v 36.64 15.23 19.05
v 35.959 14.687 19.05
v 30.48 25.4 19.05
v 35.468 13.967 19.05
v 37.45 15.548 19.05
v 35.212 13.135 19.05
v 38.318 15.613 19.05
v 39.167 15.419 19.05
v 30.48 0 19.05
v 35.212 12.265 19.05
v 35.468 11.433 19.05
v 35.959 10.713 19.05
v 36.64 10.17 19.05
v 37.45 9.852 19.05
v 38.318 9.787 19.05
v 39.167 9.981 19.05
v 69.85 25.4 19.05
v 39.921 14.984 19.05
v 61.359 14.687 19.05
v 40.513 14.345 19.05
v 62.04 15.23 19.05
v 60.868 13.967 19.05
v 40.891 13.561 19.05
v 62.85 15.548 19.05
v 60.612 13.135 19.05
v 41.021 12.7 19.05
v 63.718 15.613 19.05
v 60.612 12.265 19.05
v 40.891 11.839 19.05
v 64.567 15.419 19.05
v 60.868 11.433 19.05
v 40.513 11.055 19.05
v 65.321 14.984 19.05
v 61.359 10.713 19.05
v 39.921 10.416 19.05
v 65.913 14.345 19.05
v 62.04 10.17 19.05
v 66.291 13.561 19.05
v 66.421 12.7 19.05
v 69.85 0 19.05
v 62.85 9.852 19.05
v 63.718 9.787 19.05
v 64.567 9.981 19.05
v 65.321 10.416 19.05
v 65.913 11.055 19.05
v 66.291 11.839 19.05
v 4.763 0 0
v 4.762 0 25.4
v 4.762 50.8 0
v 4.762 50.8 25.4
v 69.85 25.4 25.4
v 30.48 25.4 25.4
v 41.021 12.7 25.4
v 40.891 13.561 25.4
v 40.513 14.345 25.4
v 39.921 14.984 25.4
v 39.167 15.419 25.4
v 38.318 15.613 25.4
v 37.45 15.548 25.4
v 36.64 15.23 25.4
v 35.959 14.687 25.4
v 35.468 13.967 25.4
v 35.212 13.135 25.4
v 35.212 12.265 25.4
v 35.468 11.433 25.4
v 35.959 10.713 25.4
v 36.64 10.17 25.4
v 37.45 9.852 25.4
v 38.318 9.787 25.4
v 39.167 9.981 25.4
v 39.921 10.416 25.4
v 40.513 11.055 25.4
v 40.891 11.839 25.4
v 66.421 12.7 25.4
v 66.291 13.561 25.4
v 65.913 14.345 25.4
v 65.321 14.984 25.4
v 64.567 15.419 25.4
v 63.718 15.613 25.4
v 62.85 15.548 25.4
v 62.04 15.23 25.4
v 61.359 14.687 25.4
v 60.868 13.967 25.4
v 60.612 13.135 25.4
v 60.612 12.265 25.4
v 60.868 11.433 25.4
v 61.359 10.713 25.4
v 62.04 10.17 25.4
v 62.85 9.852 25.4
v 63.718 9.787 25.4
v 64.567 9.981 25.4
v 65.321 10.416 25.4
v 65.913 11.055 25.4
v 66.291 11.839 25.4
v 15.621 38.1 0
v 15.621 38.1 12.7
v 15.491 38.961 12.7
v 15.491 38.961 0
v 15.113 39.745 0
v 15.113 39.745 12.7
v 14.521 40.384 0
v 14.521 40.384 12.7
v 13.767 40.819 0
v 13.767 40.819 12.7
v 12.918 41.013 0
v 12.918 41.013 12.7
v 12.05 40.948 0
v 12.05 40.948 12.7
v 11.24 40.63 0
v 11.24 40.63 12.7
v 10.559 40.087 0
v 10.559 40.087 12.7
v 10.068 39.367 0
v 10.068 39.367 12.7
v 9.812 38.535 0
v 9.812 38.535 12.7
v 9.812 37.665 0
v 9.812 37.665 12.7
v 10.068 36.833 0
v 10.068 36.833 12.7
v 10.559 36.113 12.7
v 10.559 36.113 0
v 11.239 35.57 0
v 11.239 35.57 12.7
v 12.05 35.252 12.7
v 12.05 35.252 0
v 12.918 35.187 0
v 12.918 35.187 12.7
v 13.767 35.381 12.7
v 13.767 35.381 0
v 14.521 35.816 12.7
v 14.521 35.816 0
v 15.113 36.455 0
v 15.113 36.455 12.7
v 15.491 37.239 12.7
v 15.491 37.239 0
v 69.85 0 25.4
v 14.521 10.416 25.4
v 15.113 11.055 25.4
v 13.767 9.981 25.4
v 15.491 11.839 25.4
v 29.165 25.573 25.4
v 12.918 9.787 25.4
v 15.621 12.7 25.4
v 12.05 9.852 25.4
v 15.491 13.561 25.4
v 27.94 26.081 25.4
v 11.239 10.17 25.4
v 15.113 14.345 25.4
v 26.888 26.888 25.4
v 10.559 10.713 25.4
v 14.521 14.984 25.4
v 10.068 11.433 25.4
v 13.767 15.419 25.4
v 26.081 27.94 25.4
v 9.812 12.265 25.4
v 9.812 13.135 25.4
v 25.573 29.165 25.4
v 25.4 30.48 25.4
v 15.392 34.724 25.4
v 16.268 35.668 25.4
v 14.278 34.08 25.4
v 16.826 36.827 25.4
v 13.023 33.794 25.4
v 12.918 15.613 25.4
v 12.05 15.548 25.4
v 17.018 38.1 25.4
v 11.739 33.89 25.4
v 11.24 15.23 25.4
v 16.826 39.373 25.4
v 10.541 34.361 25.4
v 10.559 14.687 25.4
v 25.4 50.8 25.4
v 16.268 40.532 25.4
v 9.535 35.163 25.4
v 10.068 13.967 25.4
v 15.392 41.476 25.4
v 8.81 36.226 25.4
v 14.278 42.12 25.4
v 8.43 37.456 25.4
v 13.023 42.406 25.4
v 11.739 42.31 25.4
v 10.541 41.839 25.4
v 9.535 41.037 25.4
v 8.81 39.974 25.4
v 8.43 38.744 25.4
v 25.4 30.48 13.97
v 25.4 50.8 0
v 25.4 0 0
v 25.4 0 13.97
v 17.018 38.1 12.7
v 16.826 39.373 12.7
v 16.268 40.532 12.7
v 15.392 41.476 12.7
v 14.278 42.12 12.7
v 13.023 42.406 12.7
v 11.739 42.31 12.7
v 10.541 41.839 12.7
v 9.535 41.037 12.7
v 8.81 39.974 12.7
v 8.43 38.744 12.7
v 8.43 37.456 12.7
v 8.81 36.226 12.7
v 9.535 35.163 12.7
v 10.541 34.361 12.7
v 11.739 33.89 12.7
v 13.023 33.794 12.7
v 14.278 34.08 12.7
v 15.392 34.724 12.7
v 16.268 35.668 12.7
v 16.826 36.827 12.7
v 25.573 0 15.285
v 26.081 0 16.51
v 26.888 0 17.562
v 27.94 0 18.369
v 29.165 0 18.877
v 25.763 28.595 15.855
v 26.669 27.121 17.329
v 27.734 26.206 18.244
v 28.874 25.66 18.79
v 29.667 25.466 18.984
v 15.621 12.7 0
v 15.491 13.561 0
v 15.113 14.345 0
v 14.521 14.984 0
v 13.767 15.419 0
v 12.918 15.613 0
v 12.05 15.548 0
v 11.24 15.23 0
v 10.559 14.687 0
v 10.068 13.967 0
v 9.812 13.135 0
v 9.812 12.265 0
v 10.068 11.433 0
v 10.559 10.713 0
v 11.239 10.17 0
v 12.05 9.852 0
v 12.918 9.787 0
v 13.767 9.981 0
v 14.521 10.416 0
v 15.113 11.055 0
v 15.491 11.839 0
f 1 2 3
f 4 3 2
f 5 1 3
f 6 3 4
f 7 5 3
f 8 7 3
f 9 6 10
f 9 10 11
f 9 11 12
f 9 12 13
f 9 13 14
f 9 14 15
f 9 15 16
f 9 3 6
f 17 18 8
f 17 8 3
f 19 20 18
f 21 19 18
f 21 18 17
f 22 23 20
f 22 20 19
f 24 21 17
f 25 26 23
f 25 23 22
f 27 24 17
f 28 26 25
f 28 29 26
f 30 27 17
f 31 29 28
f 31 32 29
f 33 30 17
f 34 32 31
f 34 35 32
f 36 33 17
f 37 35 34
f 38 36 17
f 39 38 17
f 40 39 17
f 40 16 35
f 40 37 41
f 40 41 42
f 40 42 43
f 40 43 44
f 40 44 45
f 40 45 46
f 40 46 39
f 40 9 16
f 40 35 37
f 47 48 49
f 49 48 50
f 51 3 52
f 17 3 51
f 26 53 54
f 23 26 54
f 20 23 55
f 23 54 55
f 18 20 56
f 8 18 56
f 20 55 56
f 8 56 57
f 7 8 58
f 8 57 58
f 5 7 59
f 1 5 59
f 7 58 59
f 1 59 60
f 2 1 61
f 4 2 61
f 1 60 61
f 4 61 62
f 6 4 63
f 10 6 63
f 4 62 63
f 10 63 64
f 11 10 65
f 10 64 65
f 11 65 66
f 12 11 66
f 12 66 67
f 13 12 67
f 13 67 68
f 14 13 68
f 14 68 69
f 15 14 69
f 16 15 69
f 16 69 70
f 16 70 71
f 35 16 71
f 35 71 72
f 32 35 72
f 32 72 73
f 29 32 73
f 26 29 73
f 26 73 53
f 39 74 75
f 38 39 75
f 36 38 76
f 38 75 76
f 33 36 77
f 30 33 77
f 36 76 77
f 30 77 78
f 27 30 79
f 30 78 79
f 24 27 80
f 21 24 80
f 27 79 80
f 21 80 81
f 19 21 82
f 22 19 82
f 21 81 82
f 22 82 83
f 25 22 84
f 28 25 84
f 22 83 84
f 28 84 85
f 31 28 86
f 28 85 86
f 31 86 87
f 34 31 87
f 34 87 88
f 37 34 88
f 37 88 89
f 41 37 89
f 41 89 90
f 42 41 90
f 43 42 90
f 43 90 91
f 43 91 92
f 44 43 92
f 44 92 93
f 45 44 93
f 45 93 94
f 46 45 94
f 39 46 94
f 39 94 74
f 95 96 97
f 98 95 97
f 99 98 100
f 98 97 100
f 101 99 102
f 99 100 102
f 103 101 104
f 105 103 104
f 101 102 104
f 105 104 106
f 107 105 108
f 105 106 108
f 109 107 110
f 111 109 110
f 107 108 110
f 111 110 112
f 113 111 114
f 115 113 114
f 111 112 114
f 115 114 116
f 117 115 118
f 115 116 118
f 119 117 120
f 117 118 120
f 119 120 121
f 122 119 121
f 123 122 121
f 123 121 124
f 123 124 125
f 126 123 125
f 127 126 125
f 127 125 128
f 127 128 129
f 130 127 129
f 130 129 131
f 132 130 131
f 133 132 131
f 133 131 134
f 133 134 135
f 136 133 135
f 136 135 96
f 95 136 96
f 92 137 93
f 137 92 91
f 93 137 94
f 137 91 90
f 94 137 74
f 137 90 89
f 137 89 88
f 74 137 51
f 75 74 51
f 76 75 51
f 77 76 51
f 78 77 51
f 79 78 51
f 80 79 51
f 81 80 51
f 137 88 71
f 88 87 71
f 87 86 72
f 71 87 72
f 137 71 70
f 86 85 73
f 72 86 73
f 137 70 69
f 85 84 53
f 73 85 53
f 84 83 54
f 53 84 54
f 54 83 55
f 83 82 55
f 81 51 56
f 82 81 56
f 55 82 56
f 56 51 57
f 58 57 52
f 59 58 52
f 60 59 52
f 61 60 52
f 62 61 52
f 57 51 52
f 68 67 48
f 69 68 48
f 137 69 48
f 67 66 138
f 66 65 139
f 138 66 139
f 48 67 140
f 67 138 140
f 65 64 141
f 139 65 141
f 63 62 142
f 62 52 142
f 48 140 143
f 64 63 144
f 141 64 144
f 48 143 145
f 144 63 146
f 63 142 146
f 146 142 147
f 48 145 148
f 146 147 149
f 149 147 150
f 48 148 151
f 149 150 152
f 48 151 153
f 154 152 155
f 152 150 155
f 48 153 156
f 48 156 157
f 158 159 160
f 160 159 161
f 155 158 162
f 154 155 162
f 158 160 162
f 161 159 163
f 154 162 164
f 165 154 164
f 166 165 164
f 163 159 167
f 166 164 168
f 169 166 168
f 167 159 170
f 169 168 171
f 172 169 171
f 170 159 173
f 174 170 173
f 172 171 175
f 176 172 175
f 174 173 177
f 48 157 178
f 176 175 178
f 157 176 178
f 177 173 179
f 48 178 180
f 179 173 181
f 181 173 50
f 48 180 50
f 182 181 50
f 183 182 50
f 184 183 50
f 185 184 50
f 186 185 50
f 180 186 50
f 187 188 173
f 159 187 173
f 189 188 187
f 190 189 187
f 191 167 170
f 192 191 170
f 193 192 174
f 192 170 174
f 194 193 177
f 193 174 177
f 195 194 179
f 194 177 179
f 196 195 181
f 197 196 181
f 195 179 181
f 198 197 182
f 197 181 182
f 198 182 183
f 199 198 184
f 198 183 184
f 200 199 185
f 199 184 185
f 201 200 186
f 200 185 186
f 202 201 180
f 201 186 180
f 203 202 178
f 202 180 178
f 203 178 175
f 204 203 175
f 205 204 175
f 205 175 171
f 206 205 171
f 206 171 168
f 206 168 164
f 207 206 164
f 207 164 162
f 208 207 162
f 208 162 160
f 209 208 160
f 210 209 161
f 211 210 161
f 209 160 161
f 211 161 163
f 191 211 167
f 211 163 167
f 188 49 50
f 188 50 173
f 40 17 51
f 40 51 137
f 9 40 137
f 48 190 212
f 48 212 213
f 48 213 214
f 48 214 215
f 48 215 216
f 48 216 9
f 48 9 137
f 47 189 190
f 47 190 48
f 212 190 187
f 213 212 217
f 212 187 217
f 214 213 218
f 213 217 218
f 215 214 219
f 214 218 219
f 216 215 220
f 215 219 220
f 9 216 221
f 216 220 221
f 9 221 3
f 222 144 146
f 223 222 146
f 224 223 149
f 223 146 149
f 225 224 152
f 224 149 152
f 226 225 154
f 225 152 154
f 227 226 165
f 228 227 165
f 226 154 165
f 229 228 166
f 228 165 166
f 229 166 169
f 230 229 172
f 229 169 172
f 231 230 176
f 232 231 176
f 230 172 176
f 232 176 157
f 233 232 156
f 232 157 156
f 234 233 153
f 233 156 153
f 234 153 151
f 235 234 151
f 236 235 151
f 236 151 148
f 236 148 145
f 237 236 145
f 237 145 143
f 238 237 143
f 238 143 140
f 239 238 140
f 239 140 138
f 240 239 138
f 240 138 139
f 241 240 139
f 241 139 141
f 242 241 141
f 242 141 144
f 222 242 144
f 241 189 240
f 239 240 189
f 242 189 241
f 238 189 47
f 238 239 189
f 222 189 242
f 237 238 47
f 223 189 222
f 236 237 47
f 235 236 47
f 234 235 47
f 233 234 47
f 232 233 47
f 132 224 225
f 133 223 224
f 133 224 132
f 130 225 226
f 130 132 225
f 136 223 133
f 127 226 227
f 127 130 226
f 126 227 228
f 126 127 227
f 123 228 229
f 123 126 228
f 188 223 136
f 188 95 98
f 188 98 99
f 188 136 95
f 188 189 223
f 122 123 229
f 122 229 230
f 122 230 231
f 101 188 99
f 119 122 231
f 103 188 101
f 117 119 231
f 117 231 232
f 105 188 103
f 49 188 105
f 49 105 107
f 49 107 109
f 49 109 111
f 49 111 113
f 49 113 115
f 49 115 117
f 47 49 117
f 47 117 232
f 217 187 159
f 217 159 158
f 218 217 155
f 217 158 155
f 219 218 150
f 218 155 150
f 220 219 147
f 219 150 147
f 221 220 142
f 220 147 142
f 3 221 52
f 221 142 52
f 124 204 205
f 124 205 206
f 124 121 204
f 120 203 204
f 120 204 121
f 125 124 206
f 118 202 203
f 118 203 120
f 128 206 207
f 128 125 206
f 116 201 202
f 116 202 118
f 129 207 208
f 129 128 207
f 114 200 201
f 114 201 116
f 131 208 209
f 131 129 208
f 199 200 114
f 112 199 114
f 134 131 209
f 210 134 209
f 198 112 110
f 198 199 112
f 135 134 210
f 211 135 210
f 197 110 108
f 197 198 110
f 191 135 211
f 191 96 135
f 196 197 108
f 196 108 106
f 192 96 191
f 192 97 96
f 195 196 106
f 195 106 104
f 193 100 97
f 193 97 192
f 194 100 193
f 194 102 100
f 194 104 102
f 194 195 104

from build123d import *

# Parameters (mm, degrees)
BOSS_EXTRUDE1_DEPTH = 25.4
SKETCH2_R           = 2.921
CUT_EXTRUDE1_DEPTH  = 91.02678768
SKETCH3_W           = 4.7625
SKETCH3_H           = 50.8
CUT_EXTRUDE2_DEPTH  = 91.02678768
SKETCH4_W           = 44.45
SKETCH4_H           = 19.05
CUT_EXTRUDE3_DEPTH  = 91.02678768
FILLET1_R           = 5.08
SKETCH6_R           = 4.318
CUT_EXTRUDE5_DEPTH  = 12.7


with BuildPart() as part:
    # Sketch1 → Boss-Extrude1 (new body)
    with BuildSketch(Plane.XY):
        Polygon((0, 0), (0, 50.8), (25.4, 50.8), (25.4, 25.4), (69.85, 25.4), (69.85, 0), align=None)
    extrude(amount=BOSS_EXTRUDE1_DEPTH)

    # Sketch2 → Cut-Extrude1 (cut, through all)
    with BuildSketch(Plane.XY.offset(25.4)):
        with Locations((12.7, 38.1)):
            Circle(SKETCH2_R)
        with Locations((12.7, 12.7)):
            Circle(SKETCH2_R)
        with Locations((38.1, 12.7)):
            Circle(SKETCH2_R)
        with Locations((63.5, 12.7)):
            Circle(SKETCH2_R)
    extrude(amount=-CUT_EXTRUDE1_DEPTH, mode=Mode.SUBTRACT)

    # Sketch3 → Cut-Extrude2 (cut, through all)
    with BuildSketch(Plane.XY.offset(25.4)):
        with Locations((2.38125, 25.4)):
            Rectangle(SKETCH3_W, SKETCH3_H)
    extrude(amount=-CUT_EXTRUDE2_DEPTH, mode=Mode.SUBTRACT)

    # Sketch4 → Cut-Extrude3 (cut, through all)
    with BuildSketch(Plane.XZ):
        with Locations((47.625, 9.525)):
            Rectangle(SKETCH4_W, SKETCH4_H)
    extrude(amount=-CUT_EXTRUDE3_DEPTH, mode=Mode.SUBTRACT)

    # Fillet1
    fillet1_edges = [part.edges().sort_by_distance(p)[0] for p in [
        (25.4, 25.4, 22.225),
        (25.4, 12.7, 19.05),
    ]]
    fillet(fillet1_edges, radius=FILLET1_R)

    # Sketch6 → Cut-Extrude5 (cut)
    with BuildSketch(Plane.XY.offset(25.4)):
        with Locations((12.7, 38.1)):
            Circle(SKETCH6_R)
    extrude(amount=-CUT_EXTRUDE5_DEPTH, mode=Mode.SUBTRACT)


solid = part.part
